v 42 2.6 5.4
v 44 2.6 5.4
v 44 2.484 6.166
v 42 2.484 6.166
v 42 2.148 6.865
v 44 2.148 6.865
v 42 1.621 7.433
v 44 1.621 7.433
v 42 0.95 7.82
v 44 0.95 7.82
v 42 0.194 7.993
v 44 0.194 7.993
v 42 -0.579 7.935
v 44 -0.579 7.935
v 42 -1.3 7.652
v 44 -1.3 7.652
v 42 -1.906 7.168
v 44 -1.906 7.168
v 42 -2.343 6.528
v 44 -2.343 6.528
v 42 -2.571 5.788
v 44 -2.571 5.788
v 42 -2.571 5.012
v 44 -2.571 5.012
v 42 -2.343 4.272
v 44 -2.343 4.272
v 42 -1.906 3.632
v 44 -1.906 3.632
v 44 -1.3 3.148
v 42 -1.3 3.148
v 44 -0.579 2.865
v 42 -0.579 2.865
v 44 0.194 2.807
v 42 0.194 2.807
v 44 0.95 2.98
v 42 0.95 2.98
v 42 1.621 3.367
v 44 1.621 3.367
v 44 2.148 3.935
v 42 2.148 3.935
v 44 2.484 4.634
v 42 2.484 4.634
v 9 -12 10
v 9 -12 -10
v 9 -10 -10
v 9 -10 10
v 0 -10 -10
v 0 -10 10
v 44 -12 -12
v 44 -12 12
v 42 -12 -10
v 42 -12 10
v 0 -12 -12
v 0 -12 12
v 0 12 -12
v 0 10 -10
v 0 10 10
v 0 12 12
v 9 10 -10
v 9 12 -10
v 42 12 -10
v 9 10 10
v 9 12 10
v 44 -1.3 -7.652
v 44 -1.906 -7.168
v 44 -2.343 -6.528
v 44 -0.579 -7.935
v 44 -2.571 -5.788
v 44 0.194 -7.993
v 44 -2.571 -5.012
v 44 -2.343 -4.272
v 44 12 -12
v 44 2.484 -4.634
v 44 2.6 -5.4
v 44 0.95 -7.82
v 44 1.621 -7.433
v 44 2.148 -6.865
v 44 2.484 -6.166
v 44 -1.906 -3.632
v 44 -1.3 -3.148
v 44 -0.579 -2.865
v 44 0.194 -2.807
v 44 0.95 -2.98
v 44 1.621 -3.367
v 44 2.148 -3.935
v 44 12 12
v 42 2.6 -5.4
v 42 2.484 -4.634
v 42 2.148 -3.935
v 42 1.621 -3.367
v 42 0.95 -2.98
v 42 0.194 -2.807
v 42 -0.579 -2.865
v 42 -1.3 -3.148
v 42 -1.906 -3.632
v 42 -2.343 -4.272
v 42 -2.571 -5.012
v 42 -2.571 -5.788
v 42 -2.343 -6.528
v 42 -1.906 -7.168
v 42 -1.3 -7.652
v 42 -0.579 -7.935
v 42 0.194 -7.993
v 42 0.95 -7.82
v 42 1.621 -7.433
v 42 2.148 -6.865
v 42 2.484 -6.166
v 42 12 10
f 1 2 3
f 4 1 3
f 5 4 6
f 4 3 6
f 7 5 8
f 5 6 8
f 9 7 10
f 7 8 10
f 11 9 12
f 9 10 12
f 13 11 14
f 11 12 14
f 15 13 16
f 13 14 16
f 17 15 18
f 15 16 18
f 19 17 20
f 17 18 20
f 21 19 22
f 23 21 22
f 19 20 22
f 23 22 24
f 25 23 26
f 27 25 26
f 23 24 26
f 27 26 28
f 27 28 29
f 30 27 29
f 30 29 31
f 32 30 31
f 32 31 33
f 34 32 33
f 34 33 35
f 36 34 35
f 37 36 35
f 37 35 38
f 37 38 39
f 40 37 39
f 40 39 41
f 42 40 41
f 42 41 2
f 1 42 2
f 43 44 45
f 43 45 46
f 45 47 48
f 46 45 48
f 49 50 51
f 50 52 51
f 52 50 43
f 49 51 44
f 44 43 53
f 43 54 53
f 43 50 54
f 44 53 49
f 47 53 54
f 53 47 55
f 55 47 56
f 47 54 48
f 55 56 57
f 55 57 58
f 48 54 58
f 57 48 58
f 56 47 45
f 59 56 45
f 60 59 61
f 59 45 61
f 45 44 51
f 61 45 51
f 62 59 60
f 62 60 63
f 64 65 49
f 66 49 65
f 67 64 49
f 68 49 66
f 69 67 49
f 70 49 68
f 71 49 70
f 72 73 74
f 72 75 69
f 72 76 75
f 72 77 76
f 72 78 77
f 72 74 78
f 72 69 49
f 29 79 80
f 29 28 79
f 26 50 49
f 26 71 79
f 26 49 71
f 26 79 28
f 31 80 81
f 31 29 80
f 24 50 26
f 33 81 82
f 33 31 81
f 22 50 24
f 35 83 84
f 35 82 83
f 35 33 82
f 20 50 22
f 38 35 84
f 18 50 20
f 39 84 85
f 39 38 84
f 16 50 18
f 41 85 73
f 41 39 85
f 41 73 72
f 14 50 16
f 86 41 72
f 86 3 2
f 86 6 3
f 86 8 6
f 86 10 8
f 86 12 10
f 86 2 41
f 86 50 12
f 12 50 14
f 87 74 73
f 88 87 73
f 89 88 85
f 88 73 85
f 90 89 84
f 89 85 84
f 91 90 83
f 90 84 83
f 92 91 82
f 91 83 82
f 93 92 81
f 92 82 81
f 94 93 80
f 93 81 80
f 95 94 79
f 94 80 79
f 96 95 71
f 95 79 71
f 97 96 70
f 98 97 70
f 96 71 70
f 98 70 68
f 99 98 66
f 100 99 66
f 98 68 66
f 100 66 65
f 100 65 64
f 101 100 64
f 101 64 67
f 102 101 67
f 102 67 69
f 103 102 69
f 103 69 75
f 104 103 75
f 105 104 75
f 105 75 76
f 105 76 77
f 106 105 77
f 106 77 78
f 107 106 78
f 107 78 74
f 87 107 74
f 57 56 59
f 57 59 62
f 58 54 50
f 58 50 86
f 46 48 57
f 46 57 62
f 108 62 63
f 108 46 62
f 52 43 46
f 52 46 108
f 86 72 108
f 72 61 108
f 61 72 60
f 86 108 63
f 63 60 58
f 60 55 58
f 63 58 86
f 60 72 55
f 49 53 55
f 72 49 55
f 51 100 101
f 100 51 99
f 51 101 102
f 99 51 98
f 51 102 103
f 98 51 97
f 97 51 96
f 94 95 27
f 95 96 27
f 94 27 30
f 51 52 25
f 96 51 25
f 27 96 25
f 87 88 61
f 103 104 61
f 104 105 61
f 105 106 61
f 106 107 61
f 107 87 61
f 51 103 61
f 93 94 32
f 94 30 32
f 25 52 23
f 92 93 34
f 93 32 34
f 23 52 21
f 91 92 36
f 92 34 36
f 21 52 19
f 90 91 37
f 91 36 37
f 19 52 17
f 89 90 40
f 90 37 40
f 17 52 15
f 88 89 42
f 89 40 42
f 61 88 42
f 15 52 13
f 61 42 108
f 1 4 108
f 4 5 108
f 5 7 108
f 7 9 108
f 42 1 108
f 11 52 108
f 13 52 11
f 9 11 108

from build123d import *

# Parameters (mm, degrees)
F0_W     = 24
F0_H     = 24
F0_W_2   = 20
F0_H_2   = 20
F1_DEPTH = 42
F2_W     = 33
F2_H     = 20
F3_DEPTH = 31.3
F4_W     = 24
F4_H     = 2
F4_H_2   = 22
F5_DEPTH = 2
F6_R     = 2.6
F7_DEPTH = 25


with BuildPart() as f1:
    # F0 (on Right) → F1 (new body)
    with BuildSketch(Plane.YZ):
        Rectangle(F0_W, F0_H)
        Rectangle(F0_W_2, F0_H_2, mode=Mode.SUBTRACT)
    extrude(amount=F1_DEPTH)

    # F2 (on face) → F3 (cut)
    with BuildSketch(Plane.XZ.offset(12)):
        with Locations((25.5, 0)):
            Rectangle(F2_W, F2_H)
    extrude(amount=-F3_DEPTH, mode=Mode.SUBTRACT)

    # F4 (on face) → F5 (join)
    with BuildSketch(Plane.YZ.offset(42)):
        with Locations((0, -11)):
            Rectangle(F4_W, F4_H)
        with Locations((0, 1)):
            Rectangle(F4_W, F4_H_2)
    extrude(amount=F5_DEPTH)

    # F6 (on face) → F7 (cut)
    with BuildSketch(Plane.YZ.offset(44)):
        with Locations((0, 5.4)):
            Circle(F6_R)
        with Locations((0, -5.4)):
            Circle(F6_R)
    extrude(amount=-F7_DEPTH, mode=Mode.SUBTRACT)


solid = f1.part
